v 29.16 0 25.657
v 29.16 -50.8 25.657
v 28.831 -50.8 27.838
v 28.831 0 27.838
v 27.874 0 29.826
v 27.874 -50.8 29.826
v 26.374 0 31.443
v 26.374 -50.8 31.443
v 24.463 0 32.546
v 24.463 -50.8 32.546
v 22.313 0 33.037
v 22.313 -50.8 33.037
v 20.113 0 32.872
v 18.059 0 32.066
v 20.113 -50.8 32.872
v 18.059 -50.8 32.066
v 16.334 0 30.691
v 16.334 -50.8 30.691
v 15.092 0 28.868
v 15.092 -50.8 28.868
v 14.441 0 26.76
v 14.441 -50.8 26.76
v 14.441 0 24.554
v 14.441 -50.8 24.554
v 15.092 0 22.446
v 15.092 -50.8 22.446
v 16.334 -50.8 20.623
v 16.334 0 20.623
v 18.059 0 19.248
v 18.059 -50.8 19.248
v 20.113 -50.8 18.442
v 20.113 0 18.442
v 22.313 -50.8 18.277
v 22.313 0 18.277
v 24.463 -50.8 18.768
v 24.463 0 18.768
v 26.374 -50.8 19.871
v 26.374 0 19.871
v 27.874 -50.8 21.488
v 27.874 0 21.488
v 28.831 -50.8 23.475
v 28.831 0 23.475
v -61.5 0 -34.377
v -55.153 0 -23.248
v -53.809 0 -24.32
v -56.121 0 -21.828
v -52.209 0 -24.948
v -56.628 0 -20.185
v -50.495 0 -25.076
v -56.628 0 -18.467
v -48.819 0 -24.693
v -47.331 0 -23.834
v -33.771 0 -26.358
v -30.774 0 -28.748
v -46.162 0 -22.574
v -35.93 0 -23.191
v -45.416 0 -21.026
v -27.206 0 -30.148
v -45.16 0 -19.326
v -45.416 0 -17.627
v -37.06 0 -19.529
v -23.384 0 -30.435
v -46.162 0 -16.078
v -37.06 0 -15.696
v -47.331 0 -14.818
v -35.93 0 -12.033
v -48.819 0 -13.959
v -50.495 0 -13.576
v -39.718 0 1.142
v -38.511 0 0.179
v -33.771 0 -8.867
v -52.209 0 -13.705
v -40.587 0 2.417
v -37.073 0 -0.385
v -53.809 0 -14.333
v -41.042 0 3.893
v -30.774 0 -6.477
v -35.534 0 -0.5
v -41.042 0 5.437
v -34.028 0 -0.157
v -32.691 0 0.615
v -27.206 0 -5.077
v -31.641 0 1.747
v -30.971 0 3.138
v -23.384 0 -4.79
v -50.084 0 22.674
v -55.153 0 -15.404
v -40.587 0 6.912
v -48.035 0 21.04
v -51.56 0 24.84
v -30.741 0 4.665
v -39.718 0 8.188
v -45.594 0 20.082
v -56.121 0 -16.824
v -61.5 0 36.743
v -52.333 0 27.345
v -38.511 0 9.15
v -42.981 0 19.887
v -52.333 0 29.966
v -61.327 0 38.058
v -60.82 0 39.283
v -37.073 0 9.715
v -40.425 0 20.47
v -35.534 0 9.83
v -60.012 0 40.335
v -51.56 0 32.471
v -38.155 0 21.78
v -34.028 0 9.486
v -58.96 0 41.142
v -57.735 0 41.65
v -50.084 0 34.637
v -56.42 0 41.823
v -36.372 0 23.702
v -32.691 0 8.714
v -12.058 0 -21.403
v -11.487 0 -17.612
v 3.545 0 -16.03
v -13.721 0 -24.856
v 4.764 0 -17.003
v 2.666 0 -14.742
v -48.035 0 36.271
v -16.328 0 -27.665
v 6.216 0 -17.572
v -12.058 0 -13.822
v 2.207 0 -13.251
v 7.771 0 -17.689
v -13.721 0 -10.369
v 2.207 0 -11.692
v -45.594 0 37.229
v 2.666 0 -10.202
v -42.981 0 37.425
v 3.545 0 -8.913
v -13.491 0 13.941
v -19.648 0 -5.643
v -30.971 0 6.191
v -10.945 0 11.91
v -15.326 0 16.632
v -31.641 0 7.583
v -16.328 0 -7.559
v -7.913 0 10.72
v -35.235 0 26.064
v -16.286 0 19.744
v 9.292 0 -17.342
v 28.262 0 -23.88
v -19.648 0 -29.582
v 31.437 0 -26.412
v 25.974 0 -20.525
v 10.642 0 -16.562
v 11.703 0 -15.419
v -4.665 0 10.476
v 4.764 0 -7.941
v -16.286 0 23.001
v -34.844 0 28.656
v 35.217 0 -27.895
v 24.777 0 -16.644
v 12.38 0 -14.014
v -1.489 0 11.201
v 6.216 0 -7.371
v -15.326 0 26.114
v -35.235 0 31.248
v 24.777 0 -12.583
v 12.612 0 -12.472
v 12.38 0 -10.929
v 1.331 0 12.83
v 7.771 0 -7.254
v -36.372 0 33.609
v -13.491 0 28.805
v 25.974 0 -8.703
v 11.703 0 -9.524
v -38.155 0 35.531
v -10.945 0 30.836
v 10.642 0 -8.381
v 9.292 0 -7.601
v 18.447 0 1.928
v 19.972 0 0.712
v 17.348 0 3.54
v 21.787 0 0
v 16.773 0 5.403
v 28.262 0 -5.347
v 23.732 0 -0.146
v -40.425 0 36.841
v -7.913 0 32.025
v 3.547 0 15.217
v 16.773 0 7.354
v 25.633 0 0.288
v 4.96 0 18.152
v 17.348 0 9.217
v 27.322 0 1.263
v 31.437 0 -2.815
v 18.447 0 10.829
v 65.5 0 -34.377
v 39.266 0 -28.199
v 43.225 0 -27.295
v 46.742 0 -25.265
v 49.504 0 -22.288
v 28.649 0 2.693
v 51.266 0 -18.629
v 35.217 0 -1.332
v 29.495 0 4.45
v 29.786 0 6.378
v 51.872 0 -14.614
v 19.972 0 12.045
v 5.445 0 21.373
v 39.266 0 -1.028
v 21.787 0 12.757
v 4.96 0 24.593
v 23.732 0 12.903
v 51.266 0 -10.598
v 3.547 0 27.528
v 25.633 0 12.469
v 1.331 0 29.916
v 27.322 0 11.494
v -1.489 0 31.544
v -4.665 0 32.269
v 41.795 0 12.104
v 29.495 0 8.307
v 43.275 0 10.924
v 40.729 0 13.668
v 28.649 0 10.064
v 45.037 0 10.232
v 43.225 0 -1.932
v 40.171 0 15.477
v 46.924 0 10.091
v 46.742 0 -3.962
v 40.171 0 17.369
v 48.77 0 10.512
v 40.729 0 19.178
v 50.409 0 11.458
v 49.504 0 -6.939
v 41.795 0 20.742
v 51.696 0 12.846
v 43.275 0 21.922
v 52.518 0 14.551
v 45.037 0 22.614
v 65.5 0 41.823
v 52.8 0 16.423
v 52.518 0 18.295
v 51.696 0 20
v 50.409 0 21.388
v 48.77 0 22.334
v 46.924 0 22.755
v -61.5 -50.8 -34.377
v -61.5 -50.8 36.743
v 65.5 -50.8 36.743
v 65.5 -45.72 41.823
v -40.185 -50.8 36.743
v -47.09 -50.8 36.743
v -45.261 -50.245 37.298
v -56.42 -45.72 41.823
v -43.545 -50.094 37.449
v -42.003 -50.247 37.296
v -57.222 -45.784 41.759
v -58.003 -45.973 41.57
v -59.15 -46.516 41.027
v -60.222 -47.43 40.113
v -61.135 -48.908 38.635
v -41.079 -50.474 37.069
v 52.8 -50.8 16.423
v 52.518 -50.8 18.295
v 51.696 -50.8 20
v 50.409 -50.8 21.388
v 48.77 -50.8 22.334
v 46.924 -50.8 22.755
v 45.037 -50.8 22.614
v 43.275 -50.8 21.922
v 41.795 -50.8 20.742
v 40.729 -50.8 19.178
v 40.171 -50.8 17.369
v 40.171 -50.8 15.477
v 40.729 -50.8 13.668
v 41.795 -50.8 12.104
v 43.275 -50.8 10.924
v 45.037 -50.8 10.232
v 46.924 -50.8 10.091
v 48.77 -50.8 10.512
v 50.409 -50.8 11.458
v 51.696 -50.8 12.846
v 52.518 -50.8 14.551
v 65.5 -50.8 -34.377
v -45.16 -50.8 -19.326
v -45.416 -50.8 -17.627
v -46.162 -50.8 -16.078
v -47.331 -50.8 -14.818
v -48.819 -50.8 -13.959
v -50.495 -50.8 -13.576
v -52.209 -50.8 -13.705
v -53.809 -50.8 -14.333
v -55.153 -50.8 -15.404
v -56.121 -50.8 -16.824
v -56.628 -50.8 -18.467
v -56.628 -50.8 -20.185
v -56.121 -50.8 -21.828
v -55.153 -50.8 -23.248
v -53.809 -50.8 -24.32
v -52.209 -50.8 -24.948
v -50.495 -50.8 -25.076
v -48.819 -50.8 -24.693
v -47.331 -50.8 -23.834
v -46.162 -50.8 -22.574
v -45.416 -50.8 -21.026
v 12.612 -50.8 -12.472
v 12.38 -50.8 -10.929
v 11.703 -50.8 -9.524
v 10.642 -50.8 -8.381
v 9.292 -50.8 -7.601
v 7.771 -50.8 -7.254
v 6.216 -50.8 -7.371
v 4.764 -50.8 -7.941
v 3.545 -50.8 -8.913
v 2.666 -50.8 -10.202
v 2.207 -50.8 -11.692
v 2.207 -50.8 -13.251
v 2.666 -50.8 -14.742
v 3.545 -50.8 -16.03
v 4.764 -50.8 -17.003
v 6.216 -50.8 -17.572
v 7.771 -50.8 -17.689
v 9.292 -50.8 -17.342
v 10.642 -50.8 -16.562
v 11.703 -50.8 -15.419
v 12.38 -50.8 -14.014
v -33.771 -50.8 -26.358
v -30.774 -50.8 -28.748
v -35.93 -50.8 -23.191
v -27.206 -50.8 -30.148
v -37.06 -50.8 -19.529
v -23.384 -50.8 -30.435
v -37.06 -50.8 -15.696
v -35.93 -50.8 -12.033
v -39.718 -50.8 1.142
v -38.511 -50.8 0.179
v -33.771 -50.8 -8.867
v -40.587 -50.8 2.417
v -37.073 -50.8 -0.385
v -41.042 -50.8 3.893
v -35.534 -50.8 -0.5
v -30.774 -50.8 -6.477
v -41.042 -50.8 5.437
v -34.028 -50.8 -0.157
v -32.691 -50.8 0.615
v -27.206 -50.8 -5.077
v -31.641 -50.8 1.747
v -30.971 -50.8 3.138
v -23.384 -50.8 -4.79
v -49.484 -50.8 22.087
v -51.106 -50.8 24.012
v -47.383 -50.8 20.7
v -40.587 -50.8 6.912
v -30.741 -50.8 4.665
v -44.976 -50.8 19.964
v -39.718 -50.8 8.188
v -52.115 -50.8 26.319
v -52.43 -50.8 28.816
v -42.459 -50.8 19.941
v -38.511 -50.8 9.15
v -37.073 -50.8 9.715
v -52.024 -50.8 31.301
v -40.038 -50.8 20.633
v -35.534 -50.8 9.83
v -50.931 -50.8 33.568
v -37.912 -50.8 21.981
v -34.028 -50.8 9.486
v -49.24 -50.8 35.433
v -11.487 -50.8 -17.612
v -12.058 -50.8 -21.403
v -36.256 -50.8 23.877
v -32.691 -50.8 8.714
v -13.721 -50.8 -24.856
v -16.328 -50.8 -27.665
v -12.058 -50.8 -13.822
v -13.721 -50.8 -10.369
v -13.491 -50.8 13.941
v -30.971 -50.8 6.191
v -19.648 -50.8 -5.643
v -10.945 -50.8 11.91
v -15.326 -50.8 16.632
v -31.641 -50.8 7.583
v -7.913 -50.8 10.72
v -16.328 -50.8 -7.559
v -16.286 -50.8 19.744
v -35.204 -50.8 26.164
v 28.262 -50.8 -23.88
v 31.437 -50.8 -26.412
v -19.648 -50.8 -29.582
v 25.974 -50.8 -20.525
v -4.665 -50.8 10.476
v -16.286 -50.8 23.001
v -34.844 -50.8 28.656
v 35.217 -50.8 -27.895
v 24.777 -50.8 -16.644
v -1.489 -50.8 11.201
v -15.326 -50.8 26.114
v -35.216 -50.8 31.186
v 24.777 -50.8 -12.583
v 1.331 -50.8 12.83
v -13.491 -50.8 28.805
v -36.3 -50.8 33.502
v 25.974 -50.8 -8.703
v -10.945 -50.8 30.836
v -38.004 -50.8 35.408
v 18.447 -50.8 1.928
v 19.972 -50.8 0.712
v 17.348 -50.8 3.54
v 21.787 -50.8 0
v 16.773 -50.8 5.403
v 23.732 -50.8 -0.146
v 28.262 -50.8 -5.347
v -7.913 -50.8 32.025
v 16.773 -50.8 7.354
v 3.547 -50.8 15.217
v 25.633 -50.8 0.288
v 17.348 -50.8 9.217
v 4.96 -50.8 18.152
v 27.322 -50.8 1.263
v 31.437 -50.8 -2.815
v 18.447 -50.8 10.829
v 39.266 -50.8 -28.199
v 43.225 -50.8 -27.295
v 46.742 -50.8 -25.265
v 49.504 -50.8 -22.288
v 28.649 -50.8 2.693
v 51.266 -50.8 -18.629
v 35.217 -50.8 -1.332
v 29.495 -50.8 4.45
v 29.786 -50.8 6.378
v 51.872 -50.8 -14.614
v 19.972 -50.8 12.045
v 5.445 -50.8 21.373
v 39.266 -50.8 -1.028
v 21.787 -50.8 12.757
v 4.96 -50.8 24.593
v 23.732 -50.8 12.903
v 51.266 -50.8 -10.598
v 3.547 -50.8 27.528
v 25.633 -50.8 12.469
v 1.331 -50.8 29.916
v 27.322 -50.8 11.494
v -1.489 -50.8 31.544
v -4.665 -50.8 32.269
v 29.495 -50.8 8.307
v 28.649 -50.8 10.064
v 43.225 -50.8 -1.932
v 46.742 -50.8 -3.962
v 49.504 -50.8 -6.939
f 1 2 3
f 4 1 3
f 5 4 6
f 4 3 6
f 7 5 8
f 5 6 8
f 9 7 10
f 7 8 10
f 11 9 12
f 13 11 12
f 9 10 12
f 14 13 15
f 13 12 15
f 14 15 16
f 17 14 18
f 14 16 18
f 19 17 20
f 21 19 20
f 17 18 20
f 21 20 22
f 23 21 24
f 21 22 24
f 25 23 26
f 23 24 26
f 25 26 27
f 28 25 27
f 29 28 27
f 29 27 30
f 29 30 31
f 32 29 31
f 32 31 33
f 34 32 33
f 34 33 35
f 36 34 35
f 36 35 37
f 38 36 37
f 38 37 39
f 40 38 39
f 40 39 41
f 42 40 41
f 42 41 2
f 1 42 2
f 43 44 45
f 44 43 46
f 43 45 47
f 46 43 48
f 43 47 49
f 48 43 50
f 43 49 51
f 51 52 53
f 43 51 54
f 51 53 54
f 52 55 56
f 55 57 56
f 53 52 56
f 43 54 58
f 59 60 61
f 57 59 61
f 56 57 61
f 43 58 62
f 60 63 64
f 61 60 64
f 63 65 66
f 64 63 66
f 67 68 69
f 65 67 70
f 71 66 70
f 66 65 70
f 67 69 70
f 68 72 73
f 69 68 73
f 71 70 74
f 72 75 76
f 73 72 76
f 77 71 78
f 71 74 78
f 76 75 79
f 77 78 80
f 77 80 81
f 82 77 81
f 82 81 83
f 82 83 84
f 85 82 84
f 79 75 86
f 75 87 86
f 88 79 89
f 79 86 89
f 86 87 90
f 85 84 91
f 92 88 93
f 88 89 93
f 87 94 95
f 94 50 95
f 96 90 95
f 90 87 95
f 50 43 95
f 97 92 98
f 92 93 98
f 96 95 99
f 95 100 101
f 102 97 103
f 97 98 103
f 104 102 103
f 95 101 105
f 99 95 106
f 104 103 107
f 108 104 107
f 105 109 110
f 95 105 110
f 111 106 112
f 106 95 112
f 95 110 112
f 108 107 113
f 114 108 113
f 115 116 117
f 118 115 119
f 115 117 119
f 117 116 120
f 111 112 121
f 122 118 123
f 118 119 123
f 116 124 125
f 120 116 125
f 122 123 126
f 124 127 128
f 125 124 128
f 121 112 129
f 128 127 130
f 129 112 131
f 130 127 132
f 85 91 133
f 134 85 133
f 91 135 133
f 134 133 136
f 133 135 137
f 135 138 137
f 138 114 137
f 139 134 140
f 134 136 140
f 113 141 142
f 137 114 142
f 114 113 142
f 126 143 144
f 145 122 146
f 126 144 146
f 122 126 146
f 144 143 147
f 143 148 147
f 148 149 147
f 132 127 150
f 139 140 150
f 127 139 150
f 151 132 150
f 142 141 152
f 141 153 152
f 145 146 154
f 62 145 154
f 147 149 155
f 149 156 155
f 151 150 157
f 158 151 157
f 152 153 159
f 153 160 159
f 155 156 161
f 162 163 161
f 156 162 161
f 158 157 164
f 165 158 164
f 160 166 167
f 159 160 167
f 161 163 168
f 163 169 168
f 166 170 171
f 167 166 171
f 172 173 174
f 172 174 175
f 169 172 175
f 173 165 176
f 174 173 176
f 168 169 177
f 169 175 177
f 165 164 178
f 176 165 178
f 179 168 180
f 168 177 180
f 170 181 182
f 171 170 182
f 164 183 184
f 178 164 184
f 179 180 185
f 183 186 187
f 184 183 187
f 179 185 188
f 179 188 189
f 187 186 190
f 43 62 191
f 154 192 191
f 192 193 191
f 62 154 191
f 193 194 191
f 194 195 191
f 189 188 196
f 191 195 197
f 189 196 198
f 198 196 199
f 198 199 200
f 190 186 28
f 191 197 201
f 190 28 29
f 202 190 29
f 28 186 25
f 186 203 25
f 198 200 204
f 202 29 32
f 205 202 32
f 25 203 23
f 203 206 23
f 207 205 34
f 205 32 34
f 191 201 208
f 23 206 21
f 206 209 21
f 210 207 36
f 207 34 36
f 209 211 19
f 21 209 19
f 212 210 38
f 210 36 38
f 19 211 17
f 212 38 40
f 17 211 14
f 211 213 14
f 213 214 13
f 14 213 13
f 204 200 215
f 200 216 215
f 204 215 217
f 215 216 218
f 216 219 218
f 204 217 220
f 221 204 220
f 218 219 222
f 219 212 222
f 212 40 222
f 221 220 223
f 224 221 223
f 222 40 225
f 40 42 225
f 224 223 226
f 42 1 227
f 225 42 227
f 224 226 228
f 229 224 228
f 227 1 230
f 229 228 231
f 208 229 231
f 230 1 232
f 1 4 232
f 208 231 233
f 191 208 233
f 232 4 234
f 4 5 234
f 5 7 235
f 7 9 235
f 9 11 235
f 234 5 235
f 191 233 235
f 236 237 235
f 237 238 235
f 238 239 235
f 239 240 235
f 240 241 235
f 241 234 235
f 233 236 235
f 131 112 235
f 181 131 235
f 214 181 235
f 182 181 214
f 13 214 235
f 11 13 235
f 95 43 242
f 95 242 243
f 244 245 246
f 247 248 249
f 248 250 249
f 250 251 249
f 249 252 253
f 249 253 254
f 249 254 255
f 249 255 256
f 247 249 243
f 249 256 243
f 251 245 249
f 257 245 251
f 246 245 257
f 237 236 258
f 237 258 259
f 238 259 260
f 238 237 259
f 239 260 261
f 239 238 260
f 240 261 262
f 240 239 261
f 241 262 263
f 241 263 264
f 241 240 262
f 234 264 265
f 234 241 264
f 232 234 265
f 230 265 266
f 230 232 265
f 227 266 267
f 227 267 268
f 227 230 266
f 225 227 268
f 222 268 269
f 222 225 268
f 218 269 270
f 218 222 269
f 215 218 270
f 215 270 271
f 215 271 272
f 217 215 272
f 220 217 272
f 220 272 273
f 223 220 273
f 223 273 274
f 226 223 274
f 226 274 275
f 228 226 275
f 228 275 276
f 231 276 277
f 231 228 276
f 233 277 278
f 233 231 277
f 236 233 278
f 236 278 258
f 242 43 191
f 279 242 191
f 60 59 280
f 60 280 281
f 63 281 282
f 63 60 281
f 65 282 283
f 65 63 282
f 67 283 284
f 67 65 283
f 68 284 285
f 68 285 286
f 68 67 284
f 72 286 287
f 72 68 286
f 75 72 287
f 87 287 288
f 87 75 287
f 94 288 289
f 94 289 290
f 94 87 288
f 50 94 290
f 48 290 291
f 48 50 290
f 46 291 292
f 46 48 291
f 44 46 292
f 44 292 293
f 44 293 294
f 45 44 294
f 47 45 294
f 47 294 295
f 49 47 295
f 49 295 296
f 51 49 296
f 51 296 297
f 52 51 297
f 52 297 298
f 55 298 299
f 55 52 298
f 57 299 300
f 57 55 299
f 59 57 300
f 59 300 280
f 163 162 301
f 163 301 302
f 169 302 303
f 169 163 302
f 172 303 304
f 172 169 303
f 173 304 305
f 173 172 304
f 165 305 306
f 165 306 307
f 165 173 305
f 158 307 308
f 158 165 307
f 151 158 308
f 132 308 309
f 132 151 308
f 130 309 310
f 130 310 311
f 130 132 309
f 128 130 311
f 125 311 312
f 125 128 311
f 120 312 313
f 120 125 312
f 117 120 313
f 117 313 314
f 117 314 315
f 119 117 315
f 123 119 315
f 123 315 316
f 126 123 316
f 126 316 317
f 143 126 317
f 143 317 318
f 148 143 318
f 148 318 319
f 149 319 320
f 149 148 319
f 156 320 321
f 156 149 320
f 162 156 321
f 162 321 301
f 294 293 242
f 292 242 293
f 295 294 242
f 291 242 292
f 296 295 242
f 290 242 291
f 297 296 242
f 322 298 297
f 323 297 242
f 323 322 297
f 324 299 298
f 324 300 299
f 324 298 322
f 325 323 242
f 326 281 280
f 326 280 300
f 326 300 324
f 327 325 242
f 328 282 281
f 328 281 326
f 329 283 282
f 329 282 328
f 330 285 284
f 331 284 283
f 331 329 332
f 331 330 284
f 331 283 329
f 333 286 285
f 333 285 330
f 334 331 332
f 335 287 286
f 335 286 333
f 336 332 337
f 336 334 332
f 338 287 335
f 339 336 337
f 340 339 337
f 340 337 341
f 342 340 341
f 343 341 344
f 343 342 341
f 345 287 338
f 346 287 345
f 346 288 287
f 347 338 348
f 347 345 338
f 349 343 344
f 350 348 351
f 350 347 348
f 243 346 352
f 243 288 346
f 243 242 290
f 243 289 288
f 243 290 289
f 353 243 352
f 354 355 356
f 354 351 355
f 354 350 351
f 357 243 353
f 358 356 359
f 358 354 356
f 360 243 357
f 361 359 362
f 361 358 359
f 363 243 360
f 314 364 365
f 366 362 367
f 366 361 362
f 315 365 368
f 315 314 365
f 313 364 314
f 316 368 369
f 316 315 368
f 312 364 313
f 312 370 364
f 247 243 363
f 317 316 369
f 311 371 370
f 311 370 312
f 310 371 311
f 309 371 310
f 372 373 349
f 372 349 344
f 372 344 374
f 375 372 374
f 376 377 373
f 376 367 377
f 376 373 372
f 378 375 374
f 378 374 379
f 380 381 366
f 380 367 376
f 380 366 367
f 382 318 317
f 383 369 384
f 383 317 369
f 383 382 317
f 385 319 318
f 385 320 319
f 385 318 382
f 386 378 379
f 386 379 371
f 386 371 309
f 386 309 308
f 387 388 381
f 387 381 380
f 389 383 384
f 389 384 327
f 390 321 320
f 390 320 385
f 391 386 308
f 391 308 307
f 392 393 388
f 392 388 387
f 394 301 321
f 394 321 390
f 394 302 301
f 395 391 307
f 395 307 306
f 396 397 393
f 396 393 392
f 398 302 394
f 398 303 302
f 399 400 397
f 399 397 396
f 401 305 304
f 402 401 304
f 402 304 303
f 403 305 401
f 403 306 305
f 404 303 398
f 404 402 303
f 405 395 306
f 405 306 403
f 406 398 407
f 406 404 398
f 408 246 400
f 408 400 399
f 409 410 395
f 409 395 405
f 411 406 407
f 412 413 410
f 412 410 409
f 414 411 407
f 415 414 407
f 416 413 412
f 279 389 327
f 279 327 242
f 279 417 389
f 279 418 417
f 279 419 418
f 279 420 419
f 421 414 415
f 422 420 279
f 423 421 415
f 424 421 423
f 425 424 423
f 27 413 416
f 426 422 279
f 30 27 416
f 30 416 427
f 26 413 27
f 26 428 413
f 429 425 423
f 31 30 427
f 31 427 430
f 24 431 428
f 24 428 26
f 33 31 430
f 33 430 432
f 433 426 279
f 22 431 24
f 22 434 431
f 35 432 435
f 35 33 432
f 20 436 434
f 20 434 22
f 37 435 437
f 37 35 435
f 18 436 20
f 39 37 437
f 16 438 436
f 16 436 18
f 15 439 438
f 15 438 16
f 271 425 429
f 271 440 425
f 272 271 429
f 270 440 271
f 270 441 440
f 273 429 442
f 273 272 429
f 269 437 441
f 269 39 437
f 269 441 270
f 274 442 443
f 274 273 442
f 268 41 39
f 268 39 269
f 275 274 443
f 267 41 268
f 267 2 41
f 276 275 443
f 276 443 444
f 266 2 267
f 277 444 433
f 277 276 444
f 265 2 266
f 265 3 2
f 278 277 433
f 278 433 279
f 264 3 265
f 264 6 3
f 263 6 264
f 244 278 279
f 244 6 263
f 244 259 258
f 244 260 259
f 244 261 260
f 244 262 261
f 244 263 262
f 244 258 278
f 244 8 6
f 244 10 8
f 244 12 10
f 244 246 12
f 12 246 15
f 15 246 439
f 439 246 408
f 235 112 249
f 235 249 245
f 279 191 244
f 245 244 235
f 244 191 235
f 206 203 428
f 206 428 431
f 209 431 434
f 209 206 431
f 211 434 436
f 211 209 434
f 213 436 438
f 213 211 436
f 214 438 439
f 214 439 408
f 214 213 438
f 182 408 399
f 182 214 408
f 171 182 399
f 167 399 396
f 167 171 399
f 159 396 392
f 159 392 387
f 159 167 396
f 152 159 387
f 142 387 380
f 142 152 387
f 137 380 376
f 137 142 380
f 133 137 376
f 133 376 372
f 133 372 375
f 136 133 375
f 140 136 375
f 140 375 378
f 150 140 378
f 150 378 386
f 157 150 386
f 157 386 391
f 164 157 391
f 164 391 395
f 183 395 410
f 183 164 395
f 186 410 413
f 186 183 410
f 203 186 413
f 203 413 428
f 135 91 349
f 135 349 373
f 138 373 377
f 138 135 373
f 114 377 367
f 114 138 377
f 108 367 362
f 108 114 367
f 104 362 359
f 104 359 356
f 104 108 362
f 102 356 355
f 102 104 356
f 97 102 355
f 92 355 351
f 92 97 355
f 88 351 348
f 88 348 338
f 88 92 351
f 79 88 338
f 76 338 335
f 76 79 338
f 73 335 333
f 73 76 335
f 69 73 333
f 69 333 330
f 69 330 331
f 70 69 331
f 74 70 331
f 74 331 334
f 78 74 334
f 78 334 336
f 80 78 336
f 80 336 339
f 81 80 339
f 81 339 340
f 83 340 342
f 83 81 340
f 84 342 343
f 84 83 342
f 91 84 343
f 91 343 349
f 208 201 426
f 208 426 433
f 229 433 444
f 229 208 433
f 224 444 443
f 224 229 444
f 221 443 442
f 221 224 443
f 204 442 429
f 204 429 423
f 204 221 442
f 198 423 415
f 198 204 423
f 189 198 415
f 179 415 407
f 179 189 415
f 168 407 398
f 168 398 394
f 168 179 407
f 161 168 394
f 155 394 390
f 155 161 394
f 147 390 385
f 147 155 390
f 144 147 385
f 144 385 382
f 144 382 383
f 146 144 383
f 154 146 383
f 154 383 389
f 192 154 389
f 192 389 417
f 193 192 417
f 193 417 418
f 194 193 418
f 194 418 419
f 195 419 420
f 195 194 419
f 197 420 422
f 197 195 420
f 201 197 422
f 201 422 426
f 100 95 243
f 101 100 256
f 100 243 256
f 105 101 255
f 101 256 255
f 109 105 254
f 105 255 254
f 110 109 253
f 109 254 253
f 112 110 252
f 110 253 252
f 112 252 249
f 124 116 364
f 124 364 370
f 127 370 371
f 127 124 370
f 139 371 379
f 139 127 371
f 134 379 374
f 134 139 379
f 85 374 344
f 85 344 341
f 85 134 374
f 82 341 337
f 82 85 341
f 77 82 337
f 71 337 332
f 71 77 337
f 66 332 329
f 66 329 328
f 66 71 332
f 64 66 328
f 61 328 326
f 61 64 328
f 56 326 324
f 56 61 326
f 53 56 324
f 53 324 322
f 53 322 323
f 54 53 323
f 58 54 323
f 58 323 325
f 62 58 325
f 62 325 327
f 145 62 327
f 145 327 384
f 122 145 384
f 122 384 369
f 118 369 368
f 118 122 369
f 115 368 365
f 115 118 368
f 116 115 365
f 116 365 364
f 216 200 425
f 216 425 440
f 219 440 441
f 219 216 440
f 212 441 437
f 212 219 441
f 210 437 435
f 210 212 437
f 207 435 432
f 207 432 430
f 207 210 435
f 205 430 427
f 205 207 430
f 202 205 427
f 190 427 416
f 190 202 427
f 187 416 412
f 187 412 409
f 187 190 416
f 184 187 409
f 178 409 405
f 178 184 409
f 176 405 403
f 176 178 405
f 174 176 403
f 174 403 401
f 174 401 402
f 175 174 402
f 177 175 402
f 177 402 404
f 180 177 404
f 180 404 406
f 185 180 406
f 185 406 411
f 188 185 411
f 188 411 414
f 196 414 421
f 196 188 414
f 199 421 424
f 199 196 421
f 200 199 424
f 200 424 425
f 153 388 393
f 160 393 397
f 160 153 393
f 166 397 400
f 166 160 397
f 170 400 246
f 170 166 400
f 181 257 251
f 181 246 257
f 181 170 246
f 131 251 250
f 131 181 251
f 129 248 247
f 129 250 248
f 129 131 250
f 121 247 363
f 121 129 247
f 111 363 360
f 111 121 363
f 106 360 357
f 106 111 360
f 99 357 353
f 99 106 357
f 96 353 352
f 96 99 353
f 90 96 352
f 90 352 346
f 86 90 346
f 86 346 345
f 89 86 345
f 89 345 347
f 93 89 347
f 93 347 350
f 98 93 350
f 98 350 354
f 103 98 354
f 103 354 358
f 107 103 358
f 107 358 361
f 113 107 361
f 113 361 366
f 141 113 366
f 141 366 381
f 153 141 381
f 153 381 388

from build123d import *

# Parameters (mm, degrees)
F0_W        = 127
F0_H        = 76.2
F0_R        = 5.7659781113
F0_R_2      = 12.8582731401
F0_R_3      = 5.2319601114
F0_R_4      = 13.6233305285
F0_R_5      = 5.1796195503
F0_R_6      = 10.9267536549
F0_R_7      = 8.7936415442
F0_R_8      = 6.5428428961
F0_R_9      = 6.35
F1_DEPTH    = 50.8
F2_R        = 7.4007288491
F3_DEPTH    = 51.054
F4_T1_DEPTH = 153.1282991577
F5_R        = 5.08


# Not quite as in the source:
# - a fillet or chamfer that OpenCascade refuses, or shapes differently, is made with other operations: its cross-section is extruded or revolved along the edge and cut away or added


with BuildPart() as f1:
    # F0 (on Front) → F1 (new body)
    with BuildSketch(Plane.XZ):
        with Locations((1.9998494536, 3.723031328)):
            Rectangle(F0_W, F0_H)
        with Locations((-50.9259700775, -19.3260908127)):
            Circle(F0_R, mode=Mode.SUBTRACT)
        with Locations((-24.3451949209, -17.612459138)):
            Circle(F0_R_2, mode=Mode.SUBTRACT)
        with Locations((7.3802489787, -12.4715631828)):
            Circle(F0_R_3, mode=Mode.SUBTRACT)
        with Locations((38.248244673, -14.6136032417)):
            Circle(F0_R_4, mode=Mode.SUBTRACT)
        with Locations((-35.9206944704, 4.664753098)):
            Circle(F0_R_5, mode=Mode.SUBTRACT)
        with Locations((-5.4814172909, 21.3726628572)):
            Circle(F0_R_6, mode=Mode.SUBTRACT)
        with Locations((-43.6376929283, 28.6555960774)):
            Circle(F0_R_7, mode=Mode.SUBTRACT)
        with Locations((23.2429709285, 6.3783847727)):
            Circle(F0_R_8, mode=Mode.SUBTRACT)
        with Locations((46.4498494536, 16.423031328)):
            Circle(F0_R_9, mode=Mode.SUBTRACT)
    extrude(amount=F1_DEPTH)

    # F2 (on face) → F3 (cut)
    with BuildSketch(Plane.XZ.offset(50.8)):
        with Locations((21.7594634742, 25.6567392498)):
            Circle(F2_R)
    extrude(amount=-F3_DEPTH, mode=Mode.SUBTRACT)

    # F4: chamfer of 5.08 on 1 edges, made by hand

    # F4_s2 → F4_t1 (cut)
    with BuildSketch(Plane.YZ.offset(-74.5643001253)):
        Polygon((-45.72, 41.823031328), (-50.8, 36.743031328), (-50.8, 41.823031328), align=None)
    extrude(amount=F4_T1_DEPTH, mode=Mode.SUBTRACT)

    # F5
    f5_edges = [f1.edges().sort_by_distance(p)[0] for p in [
        (-61.500151, -22.86, 41.823031),
    ]]
    fillet(f5_edges, radius=F5_R)


solid = f1.part
